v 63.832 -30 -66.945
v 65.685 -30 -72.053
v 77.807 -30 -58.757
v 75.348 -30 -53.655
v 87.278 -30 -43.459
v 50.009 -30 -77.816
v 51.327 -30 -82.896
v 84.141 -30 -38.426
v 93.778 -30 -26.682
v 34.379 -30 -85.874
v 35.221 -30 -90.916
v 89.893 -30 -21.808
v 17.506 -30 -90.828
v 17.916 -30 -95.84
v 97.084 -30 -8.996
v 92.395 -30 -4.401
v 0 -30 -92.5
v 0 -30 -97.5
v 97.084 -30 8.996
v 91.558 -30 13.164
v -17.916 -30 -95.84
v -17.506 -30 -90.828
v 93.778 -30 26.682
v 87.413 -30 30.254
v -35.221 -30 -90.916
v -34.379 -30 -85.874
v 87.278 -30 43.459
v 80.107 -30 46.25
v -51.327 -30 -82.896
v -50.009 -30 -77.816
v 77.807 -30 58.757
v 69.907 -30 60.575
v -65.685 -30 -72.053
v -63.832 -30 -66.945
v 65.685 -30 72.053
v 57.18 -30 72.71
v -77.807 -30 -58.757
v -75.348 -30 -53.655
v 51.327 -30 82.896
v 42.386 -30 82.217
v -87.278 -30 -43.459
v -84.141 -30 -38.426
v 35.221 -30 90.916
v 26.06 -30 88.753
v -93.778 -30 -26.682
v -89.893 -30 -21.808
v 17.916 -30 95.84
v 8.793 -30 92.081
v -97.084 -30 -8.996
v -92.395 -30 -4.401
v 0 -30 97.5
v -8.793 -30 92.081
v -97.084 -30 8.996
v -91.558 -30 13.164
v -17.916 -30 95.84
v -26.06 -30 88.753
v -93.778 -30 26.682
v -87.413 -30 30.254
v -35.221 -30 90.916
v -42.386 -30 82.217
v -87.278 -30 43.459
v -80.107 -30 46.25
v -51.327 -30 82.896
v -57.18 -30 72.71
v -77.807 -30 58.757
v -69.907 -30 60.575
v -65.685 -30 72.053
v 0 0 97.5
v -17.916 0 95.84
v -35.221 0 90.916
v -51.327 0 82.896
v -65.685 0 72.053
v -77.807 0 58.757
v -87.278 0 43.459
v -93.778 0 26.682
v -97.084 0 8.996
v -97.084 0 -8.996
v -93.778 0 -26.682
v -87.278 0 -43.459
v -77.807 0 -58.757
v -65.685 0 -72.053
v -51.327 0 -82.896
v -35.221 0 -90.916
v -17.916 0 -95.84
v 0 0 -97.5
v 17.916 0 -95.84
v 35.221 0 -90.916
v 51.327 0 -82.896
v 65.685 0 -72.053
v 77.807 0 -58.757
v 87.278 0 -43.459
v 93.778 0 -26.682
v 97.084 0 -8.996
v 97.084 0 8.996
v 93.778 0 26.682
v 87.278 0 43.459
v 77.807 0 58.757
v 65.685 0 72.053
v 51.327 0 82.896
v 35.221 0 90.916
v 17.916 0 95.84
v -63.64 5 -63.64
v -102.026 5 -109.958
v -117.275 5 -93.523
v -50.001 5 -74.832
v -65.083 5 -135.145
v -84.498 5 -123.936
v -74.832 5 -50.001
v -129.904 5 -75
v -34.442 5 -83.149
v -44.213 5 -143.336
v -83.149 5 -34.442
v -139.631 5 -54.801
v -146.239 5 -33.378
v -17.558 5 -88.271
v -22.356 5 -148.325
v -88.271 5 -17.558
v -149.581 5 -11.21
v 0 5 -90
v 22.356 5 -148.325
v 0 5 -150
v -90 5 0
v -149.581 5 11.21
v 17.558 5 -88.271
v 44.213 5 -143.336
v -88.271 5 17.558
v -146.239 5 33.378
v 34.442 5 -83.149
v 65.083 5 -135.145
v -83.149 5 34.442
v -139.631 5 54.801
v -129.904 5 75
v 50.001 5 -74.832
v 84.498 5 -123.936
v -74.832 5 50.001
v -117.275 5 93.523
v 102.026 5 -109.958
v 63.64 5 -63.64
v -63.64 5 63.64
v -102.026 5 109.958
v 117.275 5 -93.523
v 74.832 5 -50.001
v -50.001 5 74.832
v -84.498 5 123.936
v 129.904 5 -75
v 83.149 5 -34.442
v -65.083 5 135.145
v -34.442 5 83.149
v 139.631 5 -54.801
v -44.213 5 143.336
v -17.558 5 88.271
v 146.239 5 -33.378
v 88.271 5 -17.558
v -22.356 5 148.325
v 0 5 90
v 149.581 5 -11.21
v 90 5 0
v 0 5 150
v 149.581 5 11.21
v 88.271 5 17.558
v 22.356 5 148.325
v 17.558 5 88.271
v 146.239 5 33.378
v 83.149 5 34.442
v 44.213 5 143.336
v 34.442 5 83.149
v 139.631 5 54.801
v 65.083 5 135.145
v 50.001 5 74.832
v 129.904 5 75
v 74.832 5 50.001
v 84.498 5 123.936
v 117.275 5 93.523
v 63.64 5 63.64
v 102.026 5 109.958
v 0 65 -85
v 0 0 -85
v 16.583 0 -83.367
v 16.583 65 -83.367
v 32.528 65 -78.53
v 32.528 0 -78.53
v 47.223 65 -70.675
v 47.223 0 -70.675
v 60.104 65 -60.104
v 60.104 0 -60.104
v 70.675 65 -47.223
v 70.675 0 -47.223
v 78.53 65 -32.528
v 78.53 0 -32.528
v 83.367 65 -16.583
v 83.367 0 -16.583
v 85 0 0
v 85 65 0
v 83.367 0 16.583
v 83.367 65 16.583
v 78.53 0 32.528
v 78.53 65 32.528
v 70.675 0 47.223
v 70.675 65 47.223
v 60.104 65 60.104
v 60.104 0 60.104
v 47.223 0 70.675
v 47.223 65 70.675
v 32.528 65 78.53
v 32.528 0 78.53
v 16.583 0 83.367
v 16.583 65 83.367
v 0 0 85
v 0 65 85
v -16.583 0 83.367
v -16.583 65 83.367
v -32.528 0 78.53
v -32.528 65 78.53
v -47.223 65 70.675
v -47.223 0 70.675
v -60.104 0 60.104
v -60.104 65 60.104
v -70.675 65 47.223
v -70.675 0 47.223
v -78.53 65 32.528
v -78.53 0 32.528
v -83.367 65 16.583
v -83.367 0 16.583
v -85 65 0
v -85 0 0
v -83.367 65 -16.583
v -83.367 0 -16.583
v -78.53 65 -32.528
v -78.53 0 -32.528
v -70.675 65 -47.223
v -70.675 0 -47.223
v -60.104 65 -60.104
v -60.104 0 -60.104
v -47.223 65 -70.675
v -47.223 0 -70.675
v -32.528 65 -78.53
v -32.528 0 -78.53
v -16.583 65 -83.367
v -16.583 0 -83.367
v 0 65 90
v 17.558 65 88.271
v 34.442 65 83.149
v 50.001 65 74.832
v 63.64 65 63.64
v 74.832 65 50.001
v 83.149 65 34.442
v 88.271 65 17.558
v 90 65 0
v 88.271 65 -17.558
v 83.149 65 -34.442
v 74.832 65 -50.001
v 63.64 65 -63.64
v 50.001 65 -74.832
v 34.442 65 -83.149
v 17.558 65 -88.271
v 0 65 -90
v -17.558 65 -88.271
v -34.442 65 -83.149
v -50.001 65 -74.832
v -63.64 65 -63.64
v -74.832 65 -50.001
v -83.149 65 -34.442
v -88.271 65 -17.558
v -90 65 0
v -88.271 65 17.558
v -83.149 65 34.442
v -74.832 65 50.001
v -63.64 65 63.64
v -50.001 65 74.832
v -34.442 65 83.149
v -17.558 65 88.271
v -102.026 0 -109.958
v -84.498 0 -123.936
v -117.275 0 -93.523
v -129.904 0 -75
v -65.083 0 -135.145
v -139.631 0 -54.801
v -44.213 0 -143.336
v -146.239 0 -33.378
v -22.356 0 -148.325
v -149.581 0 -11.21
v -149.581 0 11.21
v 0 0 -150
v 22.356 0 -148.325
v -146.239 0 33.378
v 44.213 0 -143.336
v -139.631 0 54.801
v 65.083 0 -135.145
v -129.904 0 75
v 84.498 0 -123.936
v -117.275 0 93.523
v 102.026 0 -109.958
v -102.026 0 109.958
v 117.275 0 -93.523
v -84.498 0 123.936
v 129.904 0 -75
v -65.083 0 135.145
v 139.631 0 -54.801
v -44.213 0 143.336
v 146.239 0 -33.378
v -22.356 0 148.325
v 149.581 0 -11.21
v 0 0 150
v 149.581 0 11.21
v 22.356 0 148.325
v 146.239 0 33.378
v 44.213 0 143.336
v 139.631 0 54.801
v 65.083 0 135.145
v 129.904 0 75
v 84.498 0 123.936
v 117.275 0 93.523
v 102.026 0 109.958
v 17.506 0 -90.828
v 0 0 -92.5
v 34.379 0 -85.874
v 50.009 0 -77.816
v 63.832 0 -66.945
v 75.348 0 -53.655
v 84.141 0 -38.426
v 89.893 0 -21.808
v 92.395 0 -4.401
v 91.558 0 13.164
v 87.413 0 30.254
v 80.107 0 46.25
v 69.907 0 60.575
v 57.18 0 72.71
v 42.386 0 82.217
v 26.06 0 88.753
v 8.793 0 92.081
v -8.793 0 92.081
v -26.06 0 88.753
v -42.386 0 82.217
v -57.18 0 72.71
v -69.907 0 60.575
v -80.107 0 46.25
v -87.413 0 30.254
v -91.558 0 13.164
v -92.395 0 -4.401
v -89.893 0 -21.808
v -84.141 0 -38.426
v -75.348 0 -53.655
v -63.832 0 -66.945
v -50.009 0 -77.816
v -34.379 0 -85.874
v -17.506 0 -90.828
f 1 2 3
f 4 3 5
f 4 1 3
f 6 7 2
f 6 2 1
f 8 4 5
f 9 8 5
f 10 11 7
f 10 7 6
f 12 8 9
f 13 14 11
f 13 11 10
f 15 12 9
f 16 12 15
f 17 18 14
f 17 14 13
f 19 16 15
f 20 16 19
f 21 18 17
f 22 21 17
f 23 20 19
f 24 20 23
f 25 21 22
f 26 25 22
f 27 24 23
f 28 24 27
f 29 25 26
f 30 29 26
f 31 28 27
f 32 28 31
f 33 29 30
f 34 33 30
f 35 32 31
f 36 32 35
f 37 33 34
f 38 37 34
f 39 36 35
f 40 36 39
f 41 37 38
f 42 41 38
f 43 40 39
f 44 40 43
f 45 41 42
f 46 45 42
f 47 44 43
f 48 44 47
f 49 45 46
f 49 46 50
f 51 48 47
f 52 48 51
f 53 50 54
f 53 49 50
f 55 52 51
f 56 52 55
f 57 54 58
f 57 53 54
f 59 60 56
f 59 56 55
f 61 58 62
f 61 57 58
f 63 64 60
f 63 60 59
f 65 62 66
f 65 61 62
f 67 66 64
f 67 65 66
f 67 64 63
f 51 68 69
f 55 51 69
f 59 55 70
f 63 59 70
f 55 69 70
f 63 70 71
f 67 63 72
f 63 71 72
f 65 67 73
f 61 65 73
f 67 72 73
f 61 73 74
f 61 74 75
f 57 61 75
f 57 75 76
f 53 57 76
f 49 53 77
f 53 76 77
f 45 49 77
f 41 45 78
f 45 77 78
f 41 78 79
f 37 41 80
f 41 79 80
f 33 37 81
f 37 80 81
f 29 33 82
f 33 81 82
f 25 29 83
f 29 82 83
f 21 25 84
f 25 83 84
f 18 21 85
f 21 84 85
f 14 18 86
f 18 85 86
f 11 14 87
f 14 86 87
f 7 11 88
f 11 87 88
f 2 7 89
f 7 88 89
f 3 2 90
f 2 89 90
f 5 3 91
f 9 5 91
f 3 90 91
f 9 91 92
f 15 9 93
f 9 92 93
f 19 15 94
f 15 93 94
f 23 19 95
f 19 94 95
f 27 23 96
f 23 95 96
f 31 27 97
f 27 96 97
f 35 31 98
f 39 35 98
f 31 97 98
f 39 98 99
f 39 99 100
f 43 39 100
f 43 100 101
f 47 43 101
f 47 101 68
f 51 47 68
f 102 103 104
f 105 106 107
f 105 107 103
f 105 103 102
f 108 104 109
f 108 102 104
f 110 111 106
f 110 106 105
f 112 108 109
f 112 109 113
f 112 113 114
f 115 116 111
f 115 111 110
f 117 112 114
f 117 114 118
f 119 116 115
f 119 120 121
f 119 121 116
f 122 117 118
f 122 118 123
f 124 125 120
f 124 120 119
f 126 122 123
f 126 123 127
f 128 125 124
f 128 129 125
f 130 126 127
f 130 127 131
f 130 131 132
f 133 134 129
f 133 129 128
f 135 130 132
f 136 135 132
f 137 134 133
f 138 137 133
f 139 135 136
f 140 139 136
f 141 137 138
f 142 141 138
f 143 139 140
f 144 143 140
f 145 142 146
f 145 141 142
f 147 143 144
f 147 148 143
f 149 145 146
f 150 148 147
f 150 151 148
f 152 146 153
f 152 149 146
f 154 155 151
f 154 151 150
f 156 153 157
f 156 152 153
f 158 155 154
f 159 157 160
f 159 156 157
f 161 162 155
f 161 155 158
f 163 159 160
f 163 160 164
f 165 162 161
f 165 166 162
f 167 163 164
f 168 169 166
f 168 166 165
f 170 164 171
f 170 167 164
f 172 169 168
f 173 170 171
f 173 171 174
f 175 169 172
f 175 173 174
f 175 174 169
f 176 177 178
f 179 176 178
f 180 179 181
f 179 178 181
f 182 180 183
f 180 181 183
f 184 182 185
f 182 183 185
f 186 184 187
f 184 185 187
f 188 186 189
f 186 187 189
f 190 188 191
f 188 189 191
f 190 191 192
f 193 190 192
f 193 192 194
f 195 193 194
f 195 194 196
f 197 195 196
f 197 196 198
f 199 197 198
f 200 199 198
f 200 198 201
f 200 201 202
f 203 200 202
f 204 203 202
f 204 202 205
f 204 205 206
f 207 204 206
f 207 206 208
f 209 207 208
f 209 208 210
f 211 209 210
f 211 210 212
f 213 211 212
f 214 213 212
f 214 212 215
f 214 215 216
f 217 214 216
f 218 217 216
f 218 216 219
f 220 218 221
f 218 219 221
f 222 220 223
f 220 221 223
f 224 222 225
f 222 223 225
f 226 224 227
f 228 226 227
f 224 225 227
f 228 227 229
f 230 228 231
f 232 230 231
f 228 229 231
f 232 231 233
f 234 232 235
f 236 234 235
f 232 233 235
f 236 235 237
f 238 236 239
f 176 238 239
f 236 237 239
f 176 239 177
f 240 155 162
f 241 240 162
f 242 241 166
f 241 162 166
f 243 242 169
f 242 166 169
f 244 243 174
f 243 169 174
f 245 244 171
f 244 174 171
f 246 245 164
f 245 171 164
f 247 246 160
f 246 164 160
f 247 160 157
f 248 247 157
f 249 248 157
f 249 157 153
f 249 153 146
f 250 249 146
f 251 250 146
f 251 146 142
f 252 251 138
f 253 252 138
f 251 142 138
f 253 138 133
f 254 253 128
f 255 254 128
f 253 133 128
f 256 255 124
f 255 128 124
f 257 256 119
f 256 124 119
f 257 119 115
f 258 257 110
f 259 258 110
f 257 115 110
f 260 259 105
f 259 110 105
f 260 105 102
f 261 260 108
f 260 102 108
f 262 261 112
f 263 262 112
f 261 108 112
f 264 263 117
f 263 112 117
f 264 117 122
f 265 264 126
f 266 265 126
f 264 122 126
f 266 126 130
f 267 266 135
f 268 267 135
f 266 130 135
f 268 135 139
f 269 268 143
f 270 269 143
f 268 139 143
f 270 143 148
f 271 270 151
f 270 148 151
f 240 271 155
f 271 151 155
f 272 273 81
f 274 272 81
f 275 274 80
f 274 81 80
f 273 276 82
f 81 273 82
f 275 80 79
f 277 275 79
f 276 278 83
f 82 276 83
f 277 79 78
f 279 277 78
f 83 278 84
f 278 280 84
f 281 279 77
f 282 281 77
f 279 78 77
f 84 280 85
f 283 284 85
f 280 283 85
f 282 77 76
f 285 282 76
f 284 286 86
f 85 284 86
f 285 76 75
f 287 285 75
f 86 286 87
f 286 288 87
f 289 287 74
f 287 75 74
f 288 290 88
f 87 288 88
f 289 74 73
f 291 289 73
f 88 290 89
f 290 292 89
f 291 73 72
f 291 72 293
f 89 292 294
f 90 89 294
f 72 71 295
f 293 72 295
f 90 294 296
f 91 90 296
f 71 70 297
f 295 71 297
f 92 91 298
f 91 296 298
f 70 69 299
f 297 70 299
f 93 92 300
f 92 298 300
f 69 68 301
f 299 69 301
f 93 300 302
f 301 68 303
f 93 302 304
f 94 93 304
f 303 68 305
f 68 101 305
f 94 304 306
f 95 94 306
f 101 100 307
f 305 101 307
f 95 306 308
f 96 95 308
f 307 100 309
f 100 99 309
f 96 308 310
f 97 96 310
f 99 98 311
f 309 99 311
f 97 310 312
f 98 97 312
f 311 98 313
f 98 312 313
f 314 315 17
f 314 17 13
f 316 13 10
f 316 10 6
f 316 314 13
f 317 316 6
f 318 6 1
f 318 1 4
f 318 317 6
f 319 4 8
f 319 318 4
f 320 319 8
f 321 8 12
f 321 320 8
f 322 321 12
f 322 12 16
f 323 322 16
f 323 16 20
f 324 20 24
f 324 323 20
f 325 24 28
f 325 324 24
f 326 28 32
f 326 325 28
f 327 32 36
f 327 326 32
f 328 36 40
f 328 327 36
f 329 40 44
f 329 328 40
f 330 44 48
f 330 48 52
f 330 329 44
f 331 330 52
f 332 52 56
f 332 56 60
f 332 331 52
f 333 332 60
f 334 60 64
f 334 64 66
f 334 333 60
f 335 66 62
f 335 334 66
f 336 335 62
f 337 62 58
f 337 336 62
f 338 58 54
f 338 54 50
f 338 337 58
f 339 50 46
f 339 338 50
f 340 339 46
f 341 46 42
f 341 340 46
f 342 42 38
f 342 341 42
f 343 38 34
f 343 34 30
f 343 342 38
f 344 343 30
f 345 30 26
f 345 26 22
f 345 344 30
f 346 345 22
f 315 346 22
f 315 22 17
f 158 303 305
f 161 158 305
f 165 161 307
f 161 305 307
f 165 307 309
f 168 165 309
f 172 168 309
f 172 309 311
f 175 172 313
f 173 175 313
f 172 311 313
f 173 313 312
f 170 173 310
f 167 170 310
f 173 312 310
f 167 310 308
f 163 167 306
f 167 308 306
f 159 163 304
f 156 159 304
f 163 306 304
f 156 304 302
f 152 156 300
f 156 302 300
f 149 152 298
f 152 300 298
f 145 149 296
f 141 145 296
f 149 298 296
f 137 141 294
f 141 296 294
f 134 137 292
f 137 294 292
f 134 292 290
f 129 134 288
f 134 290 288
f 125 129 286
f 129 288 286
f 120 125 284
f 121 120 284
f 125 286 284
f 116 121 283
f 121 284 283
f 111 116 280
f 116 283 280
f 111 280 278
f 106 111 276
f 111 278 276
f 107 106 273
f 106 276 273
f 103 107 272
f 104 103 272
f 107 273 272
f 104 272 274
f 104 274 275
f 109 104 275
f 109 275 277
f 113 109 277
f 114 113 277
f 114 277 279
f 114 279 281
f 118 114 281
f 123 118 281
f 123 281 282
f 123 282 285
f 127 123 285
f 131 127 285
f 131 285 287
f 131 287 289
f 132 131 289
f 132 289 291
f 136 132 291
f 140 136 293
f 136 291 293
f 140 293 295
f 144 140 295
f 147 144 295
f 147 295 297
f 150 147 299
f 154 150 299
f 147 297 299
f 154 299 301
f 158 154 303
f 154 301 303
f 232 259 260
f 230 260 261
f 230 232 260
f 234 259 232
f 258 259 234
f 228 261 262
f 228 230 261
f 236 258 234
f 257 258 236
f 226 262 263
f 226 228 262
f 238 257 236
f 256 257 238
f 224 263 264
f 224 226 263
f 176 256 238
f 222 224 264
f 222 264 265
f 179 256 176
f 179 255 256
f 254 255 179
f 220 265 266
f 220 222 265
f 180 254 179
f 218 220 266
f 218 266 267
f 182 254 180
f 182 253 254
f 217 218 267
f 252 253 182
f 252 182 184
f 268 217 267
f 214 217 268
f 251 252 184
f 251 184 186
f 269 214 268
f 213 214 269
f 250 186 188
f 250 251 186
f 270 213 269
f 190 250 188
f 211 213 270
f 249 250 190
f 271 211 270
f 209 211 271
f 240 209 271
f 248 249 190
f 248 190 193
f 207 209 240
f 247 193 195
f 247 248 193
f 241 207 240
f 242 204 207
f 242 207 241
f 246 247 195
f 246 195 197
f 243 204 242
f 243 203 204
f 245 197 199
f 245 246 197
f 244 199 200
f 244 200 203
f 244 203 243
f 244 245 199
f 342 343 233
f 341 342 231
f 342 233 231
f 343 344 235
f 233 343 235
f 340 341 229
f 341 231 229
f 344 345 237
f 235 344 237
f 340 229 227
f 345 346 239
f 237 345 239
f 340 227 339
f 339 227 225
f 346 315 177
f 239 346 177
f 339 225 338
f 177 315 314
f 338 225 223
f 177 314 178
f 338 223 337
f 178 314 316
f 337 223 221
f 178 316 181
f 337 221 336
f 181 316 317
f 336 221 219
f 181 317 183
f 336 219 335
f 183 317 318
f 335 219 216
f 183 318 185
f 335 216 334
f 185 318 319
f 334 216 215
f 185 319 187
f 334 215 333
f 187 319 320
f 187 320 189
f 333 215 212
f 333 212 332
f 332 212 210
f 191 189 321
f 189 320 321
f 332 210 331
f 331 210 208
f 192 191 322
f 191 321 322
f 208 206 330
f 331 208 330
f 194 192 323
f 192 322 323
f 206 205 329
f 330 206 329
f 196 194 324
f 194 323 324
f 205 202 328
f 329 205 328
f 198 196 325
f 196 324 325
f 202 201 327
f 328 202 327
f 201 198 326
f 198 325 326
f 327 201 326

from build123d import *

# Parameters (mm, degrees)
SKETCH_2_R          = 150
EXTRUDE_1_DEPTH     = 5
SKETCH_3_R          = 90
EXTRUDE_2_DEPTH     = 60
SKETCH_4_R          = 85
CUT_EXTRUDE_1_DEPTH = 222.867077323
SKETCH_5_R          = 97.5
SKETCH_5_R_2        = 92.5
EXTRUDE_3_DEPTH     = 30


with BuildPart() as part:
    # 草图2 → 凸台-拉伸1 (new body)
    with BuildSketch(Plane(origin=(0, 0, 0), x_dir=(1, 0, 0), z_dir=(0, 1, 0))):
        with Locations(Location((0, 0, 0), (0, 0, 270))):
            Circle(SKETCH_2_R)
    extrude(amount=EXTRUDE_1_DEPTH)

    # 草图3 → 凸台-拉伸2 (add)
    with BuildSketch(Plane(origin=(0, 5, 0), x_dir=(1, 0, 0), z_dir=(0, 1, 0))):
        with Locations(Location((0, 0, 0), (0, 0, 270))):
            Circle(SKETCH_3_R)
    extrude(amount=EXTRUDE_2_DEPTH)

    # 草图4 → 切除-拉伸1 (cut, through all)
    with BuildSketch(Plane.XZ):
        with Locations(Location((0, 0, 0), (0, 0, 270))):
            Circle(SKETCH_4_R)
    extrude(amount=-CUT_EXTRUDE_1_DEPTH, mode=Mode.SUBTRACT)

    # 草图5 → 凸台-拉伸3 (add)
    with BuildSketch(Plane.XZ):
        with Locations(Location((0, 0, 0), (0, 0, 90))):
            Circle(SKETCH_5_R)
        with Locations(Location((0, 0, 0), (0, 0, 270))):
            Circle(SKETCH_5_R_2, mode=Mode.SUBTRACT)
    extrude(amount=EXTRUDE_3_DEPTH)


solid = part.part
